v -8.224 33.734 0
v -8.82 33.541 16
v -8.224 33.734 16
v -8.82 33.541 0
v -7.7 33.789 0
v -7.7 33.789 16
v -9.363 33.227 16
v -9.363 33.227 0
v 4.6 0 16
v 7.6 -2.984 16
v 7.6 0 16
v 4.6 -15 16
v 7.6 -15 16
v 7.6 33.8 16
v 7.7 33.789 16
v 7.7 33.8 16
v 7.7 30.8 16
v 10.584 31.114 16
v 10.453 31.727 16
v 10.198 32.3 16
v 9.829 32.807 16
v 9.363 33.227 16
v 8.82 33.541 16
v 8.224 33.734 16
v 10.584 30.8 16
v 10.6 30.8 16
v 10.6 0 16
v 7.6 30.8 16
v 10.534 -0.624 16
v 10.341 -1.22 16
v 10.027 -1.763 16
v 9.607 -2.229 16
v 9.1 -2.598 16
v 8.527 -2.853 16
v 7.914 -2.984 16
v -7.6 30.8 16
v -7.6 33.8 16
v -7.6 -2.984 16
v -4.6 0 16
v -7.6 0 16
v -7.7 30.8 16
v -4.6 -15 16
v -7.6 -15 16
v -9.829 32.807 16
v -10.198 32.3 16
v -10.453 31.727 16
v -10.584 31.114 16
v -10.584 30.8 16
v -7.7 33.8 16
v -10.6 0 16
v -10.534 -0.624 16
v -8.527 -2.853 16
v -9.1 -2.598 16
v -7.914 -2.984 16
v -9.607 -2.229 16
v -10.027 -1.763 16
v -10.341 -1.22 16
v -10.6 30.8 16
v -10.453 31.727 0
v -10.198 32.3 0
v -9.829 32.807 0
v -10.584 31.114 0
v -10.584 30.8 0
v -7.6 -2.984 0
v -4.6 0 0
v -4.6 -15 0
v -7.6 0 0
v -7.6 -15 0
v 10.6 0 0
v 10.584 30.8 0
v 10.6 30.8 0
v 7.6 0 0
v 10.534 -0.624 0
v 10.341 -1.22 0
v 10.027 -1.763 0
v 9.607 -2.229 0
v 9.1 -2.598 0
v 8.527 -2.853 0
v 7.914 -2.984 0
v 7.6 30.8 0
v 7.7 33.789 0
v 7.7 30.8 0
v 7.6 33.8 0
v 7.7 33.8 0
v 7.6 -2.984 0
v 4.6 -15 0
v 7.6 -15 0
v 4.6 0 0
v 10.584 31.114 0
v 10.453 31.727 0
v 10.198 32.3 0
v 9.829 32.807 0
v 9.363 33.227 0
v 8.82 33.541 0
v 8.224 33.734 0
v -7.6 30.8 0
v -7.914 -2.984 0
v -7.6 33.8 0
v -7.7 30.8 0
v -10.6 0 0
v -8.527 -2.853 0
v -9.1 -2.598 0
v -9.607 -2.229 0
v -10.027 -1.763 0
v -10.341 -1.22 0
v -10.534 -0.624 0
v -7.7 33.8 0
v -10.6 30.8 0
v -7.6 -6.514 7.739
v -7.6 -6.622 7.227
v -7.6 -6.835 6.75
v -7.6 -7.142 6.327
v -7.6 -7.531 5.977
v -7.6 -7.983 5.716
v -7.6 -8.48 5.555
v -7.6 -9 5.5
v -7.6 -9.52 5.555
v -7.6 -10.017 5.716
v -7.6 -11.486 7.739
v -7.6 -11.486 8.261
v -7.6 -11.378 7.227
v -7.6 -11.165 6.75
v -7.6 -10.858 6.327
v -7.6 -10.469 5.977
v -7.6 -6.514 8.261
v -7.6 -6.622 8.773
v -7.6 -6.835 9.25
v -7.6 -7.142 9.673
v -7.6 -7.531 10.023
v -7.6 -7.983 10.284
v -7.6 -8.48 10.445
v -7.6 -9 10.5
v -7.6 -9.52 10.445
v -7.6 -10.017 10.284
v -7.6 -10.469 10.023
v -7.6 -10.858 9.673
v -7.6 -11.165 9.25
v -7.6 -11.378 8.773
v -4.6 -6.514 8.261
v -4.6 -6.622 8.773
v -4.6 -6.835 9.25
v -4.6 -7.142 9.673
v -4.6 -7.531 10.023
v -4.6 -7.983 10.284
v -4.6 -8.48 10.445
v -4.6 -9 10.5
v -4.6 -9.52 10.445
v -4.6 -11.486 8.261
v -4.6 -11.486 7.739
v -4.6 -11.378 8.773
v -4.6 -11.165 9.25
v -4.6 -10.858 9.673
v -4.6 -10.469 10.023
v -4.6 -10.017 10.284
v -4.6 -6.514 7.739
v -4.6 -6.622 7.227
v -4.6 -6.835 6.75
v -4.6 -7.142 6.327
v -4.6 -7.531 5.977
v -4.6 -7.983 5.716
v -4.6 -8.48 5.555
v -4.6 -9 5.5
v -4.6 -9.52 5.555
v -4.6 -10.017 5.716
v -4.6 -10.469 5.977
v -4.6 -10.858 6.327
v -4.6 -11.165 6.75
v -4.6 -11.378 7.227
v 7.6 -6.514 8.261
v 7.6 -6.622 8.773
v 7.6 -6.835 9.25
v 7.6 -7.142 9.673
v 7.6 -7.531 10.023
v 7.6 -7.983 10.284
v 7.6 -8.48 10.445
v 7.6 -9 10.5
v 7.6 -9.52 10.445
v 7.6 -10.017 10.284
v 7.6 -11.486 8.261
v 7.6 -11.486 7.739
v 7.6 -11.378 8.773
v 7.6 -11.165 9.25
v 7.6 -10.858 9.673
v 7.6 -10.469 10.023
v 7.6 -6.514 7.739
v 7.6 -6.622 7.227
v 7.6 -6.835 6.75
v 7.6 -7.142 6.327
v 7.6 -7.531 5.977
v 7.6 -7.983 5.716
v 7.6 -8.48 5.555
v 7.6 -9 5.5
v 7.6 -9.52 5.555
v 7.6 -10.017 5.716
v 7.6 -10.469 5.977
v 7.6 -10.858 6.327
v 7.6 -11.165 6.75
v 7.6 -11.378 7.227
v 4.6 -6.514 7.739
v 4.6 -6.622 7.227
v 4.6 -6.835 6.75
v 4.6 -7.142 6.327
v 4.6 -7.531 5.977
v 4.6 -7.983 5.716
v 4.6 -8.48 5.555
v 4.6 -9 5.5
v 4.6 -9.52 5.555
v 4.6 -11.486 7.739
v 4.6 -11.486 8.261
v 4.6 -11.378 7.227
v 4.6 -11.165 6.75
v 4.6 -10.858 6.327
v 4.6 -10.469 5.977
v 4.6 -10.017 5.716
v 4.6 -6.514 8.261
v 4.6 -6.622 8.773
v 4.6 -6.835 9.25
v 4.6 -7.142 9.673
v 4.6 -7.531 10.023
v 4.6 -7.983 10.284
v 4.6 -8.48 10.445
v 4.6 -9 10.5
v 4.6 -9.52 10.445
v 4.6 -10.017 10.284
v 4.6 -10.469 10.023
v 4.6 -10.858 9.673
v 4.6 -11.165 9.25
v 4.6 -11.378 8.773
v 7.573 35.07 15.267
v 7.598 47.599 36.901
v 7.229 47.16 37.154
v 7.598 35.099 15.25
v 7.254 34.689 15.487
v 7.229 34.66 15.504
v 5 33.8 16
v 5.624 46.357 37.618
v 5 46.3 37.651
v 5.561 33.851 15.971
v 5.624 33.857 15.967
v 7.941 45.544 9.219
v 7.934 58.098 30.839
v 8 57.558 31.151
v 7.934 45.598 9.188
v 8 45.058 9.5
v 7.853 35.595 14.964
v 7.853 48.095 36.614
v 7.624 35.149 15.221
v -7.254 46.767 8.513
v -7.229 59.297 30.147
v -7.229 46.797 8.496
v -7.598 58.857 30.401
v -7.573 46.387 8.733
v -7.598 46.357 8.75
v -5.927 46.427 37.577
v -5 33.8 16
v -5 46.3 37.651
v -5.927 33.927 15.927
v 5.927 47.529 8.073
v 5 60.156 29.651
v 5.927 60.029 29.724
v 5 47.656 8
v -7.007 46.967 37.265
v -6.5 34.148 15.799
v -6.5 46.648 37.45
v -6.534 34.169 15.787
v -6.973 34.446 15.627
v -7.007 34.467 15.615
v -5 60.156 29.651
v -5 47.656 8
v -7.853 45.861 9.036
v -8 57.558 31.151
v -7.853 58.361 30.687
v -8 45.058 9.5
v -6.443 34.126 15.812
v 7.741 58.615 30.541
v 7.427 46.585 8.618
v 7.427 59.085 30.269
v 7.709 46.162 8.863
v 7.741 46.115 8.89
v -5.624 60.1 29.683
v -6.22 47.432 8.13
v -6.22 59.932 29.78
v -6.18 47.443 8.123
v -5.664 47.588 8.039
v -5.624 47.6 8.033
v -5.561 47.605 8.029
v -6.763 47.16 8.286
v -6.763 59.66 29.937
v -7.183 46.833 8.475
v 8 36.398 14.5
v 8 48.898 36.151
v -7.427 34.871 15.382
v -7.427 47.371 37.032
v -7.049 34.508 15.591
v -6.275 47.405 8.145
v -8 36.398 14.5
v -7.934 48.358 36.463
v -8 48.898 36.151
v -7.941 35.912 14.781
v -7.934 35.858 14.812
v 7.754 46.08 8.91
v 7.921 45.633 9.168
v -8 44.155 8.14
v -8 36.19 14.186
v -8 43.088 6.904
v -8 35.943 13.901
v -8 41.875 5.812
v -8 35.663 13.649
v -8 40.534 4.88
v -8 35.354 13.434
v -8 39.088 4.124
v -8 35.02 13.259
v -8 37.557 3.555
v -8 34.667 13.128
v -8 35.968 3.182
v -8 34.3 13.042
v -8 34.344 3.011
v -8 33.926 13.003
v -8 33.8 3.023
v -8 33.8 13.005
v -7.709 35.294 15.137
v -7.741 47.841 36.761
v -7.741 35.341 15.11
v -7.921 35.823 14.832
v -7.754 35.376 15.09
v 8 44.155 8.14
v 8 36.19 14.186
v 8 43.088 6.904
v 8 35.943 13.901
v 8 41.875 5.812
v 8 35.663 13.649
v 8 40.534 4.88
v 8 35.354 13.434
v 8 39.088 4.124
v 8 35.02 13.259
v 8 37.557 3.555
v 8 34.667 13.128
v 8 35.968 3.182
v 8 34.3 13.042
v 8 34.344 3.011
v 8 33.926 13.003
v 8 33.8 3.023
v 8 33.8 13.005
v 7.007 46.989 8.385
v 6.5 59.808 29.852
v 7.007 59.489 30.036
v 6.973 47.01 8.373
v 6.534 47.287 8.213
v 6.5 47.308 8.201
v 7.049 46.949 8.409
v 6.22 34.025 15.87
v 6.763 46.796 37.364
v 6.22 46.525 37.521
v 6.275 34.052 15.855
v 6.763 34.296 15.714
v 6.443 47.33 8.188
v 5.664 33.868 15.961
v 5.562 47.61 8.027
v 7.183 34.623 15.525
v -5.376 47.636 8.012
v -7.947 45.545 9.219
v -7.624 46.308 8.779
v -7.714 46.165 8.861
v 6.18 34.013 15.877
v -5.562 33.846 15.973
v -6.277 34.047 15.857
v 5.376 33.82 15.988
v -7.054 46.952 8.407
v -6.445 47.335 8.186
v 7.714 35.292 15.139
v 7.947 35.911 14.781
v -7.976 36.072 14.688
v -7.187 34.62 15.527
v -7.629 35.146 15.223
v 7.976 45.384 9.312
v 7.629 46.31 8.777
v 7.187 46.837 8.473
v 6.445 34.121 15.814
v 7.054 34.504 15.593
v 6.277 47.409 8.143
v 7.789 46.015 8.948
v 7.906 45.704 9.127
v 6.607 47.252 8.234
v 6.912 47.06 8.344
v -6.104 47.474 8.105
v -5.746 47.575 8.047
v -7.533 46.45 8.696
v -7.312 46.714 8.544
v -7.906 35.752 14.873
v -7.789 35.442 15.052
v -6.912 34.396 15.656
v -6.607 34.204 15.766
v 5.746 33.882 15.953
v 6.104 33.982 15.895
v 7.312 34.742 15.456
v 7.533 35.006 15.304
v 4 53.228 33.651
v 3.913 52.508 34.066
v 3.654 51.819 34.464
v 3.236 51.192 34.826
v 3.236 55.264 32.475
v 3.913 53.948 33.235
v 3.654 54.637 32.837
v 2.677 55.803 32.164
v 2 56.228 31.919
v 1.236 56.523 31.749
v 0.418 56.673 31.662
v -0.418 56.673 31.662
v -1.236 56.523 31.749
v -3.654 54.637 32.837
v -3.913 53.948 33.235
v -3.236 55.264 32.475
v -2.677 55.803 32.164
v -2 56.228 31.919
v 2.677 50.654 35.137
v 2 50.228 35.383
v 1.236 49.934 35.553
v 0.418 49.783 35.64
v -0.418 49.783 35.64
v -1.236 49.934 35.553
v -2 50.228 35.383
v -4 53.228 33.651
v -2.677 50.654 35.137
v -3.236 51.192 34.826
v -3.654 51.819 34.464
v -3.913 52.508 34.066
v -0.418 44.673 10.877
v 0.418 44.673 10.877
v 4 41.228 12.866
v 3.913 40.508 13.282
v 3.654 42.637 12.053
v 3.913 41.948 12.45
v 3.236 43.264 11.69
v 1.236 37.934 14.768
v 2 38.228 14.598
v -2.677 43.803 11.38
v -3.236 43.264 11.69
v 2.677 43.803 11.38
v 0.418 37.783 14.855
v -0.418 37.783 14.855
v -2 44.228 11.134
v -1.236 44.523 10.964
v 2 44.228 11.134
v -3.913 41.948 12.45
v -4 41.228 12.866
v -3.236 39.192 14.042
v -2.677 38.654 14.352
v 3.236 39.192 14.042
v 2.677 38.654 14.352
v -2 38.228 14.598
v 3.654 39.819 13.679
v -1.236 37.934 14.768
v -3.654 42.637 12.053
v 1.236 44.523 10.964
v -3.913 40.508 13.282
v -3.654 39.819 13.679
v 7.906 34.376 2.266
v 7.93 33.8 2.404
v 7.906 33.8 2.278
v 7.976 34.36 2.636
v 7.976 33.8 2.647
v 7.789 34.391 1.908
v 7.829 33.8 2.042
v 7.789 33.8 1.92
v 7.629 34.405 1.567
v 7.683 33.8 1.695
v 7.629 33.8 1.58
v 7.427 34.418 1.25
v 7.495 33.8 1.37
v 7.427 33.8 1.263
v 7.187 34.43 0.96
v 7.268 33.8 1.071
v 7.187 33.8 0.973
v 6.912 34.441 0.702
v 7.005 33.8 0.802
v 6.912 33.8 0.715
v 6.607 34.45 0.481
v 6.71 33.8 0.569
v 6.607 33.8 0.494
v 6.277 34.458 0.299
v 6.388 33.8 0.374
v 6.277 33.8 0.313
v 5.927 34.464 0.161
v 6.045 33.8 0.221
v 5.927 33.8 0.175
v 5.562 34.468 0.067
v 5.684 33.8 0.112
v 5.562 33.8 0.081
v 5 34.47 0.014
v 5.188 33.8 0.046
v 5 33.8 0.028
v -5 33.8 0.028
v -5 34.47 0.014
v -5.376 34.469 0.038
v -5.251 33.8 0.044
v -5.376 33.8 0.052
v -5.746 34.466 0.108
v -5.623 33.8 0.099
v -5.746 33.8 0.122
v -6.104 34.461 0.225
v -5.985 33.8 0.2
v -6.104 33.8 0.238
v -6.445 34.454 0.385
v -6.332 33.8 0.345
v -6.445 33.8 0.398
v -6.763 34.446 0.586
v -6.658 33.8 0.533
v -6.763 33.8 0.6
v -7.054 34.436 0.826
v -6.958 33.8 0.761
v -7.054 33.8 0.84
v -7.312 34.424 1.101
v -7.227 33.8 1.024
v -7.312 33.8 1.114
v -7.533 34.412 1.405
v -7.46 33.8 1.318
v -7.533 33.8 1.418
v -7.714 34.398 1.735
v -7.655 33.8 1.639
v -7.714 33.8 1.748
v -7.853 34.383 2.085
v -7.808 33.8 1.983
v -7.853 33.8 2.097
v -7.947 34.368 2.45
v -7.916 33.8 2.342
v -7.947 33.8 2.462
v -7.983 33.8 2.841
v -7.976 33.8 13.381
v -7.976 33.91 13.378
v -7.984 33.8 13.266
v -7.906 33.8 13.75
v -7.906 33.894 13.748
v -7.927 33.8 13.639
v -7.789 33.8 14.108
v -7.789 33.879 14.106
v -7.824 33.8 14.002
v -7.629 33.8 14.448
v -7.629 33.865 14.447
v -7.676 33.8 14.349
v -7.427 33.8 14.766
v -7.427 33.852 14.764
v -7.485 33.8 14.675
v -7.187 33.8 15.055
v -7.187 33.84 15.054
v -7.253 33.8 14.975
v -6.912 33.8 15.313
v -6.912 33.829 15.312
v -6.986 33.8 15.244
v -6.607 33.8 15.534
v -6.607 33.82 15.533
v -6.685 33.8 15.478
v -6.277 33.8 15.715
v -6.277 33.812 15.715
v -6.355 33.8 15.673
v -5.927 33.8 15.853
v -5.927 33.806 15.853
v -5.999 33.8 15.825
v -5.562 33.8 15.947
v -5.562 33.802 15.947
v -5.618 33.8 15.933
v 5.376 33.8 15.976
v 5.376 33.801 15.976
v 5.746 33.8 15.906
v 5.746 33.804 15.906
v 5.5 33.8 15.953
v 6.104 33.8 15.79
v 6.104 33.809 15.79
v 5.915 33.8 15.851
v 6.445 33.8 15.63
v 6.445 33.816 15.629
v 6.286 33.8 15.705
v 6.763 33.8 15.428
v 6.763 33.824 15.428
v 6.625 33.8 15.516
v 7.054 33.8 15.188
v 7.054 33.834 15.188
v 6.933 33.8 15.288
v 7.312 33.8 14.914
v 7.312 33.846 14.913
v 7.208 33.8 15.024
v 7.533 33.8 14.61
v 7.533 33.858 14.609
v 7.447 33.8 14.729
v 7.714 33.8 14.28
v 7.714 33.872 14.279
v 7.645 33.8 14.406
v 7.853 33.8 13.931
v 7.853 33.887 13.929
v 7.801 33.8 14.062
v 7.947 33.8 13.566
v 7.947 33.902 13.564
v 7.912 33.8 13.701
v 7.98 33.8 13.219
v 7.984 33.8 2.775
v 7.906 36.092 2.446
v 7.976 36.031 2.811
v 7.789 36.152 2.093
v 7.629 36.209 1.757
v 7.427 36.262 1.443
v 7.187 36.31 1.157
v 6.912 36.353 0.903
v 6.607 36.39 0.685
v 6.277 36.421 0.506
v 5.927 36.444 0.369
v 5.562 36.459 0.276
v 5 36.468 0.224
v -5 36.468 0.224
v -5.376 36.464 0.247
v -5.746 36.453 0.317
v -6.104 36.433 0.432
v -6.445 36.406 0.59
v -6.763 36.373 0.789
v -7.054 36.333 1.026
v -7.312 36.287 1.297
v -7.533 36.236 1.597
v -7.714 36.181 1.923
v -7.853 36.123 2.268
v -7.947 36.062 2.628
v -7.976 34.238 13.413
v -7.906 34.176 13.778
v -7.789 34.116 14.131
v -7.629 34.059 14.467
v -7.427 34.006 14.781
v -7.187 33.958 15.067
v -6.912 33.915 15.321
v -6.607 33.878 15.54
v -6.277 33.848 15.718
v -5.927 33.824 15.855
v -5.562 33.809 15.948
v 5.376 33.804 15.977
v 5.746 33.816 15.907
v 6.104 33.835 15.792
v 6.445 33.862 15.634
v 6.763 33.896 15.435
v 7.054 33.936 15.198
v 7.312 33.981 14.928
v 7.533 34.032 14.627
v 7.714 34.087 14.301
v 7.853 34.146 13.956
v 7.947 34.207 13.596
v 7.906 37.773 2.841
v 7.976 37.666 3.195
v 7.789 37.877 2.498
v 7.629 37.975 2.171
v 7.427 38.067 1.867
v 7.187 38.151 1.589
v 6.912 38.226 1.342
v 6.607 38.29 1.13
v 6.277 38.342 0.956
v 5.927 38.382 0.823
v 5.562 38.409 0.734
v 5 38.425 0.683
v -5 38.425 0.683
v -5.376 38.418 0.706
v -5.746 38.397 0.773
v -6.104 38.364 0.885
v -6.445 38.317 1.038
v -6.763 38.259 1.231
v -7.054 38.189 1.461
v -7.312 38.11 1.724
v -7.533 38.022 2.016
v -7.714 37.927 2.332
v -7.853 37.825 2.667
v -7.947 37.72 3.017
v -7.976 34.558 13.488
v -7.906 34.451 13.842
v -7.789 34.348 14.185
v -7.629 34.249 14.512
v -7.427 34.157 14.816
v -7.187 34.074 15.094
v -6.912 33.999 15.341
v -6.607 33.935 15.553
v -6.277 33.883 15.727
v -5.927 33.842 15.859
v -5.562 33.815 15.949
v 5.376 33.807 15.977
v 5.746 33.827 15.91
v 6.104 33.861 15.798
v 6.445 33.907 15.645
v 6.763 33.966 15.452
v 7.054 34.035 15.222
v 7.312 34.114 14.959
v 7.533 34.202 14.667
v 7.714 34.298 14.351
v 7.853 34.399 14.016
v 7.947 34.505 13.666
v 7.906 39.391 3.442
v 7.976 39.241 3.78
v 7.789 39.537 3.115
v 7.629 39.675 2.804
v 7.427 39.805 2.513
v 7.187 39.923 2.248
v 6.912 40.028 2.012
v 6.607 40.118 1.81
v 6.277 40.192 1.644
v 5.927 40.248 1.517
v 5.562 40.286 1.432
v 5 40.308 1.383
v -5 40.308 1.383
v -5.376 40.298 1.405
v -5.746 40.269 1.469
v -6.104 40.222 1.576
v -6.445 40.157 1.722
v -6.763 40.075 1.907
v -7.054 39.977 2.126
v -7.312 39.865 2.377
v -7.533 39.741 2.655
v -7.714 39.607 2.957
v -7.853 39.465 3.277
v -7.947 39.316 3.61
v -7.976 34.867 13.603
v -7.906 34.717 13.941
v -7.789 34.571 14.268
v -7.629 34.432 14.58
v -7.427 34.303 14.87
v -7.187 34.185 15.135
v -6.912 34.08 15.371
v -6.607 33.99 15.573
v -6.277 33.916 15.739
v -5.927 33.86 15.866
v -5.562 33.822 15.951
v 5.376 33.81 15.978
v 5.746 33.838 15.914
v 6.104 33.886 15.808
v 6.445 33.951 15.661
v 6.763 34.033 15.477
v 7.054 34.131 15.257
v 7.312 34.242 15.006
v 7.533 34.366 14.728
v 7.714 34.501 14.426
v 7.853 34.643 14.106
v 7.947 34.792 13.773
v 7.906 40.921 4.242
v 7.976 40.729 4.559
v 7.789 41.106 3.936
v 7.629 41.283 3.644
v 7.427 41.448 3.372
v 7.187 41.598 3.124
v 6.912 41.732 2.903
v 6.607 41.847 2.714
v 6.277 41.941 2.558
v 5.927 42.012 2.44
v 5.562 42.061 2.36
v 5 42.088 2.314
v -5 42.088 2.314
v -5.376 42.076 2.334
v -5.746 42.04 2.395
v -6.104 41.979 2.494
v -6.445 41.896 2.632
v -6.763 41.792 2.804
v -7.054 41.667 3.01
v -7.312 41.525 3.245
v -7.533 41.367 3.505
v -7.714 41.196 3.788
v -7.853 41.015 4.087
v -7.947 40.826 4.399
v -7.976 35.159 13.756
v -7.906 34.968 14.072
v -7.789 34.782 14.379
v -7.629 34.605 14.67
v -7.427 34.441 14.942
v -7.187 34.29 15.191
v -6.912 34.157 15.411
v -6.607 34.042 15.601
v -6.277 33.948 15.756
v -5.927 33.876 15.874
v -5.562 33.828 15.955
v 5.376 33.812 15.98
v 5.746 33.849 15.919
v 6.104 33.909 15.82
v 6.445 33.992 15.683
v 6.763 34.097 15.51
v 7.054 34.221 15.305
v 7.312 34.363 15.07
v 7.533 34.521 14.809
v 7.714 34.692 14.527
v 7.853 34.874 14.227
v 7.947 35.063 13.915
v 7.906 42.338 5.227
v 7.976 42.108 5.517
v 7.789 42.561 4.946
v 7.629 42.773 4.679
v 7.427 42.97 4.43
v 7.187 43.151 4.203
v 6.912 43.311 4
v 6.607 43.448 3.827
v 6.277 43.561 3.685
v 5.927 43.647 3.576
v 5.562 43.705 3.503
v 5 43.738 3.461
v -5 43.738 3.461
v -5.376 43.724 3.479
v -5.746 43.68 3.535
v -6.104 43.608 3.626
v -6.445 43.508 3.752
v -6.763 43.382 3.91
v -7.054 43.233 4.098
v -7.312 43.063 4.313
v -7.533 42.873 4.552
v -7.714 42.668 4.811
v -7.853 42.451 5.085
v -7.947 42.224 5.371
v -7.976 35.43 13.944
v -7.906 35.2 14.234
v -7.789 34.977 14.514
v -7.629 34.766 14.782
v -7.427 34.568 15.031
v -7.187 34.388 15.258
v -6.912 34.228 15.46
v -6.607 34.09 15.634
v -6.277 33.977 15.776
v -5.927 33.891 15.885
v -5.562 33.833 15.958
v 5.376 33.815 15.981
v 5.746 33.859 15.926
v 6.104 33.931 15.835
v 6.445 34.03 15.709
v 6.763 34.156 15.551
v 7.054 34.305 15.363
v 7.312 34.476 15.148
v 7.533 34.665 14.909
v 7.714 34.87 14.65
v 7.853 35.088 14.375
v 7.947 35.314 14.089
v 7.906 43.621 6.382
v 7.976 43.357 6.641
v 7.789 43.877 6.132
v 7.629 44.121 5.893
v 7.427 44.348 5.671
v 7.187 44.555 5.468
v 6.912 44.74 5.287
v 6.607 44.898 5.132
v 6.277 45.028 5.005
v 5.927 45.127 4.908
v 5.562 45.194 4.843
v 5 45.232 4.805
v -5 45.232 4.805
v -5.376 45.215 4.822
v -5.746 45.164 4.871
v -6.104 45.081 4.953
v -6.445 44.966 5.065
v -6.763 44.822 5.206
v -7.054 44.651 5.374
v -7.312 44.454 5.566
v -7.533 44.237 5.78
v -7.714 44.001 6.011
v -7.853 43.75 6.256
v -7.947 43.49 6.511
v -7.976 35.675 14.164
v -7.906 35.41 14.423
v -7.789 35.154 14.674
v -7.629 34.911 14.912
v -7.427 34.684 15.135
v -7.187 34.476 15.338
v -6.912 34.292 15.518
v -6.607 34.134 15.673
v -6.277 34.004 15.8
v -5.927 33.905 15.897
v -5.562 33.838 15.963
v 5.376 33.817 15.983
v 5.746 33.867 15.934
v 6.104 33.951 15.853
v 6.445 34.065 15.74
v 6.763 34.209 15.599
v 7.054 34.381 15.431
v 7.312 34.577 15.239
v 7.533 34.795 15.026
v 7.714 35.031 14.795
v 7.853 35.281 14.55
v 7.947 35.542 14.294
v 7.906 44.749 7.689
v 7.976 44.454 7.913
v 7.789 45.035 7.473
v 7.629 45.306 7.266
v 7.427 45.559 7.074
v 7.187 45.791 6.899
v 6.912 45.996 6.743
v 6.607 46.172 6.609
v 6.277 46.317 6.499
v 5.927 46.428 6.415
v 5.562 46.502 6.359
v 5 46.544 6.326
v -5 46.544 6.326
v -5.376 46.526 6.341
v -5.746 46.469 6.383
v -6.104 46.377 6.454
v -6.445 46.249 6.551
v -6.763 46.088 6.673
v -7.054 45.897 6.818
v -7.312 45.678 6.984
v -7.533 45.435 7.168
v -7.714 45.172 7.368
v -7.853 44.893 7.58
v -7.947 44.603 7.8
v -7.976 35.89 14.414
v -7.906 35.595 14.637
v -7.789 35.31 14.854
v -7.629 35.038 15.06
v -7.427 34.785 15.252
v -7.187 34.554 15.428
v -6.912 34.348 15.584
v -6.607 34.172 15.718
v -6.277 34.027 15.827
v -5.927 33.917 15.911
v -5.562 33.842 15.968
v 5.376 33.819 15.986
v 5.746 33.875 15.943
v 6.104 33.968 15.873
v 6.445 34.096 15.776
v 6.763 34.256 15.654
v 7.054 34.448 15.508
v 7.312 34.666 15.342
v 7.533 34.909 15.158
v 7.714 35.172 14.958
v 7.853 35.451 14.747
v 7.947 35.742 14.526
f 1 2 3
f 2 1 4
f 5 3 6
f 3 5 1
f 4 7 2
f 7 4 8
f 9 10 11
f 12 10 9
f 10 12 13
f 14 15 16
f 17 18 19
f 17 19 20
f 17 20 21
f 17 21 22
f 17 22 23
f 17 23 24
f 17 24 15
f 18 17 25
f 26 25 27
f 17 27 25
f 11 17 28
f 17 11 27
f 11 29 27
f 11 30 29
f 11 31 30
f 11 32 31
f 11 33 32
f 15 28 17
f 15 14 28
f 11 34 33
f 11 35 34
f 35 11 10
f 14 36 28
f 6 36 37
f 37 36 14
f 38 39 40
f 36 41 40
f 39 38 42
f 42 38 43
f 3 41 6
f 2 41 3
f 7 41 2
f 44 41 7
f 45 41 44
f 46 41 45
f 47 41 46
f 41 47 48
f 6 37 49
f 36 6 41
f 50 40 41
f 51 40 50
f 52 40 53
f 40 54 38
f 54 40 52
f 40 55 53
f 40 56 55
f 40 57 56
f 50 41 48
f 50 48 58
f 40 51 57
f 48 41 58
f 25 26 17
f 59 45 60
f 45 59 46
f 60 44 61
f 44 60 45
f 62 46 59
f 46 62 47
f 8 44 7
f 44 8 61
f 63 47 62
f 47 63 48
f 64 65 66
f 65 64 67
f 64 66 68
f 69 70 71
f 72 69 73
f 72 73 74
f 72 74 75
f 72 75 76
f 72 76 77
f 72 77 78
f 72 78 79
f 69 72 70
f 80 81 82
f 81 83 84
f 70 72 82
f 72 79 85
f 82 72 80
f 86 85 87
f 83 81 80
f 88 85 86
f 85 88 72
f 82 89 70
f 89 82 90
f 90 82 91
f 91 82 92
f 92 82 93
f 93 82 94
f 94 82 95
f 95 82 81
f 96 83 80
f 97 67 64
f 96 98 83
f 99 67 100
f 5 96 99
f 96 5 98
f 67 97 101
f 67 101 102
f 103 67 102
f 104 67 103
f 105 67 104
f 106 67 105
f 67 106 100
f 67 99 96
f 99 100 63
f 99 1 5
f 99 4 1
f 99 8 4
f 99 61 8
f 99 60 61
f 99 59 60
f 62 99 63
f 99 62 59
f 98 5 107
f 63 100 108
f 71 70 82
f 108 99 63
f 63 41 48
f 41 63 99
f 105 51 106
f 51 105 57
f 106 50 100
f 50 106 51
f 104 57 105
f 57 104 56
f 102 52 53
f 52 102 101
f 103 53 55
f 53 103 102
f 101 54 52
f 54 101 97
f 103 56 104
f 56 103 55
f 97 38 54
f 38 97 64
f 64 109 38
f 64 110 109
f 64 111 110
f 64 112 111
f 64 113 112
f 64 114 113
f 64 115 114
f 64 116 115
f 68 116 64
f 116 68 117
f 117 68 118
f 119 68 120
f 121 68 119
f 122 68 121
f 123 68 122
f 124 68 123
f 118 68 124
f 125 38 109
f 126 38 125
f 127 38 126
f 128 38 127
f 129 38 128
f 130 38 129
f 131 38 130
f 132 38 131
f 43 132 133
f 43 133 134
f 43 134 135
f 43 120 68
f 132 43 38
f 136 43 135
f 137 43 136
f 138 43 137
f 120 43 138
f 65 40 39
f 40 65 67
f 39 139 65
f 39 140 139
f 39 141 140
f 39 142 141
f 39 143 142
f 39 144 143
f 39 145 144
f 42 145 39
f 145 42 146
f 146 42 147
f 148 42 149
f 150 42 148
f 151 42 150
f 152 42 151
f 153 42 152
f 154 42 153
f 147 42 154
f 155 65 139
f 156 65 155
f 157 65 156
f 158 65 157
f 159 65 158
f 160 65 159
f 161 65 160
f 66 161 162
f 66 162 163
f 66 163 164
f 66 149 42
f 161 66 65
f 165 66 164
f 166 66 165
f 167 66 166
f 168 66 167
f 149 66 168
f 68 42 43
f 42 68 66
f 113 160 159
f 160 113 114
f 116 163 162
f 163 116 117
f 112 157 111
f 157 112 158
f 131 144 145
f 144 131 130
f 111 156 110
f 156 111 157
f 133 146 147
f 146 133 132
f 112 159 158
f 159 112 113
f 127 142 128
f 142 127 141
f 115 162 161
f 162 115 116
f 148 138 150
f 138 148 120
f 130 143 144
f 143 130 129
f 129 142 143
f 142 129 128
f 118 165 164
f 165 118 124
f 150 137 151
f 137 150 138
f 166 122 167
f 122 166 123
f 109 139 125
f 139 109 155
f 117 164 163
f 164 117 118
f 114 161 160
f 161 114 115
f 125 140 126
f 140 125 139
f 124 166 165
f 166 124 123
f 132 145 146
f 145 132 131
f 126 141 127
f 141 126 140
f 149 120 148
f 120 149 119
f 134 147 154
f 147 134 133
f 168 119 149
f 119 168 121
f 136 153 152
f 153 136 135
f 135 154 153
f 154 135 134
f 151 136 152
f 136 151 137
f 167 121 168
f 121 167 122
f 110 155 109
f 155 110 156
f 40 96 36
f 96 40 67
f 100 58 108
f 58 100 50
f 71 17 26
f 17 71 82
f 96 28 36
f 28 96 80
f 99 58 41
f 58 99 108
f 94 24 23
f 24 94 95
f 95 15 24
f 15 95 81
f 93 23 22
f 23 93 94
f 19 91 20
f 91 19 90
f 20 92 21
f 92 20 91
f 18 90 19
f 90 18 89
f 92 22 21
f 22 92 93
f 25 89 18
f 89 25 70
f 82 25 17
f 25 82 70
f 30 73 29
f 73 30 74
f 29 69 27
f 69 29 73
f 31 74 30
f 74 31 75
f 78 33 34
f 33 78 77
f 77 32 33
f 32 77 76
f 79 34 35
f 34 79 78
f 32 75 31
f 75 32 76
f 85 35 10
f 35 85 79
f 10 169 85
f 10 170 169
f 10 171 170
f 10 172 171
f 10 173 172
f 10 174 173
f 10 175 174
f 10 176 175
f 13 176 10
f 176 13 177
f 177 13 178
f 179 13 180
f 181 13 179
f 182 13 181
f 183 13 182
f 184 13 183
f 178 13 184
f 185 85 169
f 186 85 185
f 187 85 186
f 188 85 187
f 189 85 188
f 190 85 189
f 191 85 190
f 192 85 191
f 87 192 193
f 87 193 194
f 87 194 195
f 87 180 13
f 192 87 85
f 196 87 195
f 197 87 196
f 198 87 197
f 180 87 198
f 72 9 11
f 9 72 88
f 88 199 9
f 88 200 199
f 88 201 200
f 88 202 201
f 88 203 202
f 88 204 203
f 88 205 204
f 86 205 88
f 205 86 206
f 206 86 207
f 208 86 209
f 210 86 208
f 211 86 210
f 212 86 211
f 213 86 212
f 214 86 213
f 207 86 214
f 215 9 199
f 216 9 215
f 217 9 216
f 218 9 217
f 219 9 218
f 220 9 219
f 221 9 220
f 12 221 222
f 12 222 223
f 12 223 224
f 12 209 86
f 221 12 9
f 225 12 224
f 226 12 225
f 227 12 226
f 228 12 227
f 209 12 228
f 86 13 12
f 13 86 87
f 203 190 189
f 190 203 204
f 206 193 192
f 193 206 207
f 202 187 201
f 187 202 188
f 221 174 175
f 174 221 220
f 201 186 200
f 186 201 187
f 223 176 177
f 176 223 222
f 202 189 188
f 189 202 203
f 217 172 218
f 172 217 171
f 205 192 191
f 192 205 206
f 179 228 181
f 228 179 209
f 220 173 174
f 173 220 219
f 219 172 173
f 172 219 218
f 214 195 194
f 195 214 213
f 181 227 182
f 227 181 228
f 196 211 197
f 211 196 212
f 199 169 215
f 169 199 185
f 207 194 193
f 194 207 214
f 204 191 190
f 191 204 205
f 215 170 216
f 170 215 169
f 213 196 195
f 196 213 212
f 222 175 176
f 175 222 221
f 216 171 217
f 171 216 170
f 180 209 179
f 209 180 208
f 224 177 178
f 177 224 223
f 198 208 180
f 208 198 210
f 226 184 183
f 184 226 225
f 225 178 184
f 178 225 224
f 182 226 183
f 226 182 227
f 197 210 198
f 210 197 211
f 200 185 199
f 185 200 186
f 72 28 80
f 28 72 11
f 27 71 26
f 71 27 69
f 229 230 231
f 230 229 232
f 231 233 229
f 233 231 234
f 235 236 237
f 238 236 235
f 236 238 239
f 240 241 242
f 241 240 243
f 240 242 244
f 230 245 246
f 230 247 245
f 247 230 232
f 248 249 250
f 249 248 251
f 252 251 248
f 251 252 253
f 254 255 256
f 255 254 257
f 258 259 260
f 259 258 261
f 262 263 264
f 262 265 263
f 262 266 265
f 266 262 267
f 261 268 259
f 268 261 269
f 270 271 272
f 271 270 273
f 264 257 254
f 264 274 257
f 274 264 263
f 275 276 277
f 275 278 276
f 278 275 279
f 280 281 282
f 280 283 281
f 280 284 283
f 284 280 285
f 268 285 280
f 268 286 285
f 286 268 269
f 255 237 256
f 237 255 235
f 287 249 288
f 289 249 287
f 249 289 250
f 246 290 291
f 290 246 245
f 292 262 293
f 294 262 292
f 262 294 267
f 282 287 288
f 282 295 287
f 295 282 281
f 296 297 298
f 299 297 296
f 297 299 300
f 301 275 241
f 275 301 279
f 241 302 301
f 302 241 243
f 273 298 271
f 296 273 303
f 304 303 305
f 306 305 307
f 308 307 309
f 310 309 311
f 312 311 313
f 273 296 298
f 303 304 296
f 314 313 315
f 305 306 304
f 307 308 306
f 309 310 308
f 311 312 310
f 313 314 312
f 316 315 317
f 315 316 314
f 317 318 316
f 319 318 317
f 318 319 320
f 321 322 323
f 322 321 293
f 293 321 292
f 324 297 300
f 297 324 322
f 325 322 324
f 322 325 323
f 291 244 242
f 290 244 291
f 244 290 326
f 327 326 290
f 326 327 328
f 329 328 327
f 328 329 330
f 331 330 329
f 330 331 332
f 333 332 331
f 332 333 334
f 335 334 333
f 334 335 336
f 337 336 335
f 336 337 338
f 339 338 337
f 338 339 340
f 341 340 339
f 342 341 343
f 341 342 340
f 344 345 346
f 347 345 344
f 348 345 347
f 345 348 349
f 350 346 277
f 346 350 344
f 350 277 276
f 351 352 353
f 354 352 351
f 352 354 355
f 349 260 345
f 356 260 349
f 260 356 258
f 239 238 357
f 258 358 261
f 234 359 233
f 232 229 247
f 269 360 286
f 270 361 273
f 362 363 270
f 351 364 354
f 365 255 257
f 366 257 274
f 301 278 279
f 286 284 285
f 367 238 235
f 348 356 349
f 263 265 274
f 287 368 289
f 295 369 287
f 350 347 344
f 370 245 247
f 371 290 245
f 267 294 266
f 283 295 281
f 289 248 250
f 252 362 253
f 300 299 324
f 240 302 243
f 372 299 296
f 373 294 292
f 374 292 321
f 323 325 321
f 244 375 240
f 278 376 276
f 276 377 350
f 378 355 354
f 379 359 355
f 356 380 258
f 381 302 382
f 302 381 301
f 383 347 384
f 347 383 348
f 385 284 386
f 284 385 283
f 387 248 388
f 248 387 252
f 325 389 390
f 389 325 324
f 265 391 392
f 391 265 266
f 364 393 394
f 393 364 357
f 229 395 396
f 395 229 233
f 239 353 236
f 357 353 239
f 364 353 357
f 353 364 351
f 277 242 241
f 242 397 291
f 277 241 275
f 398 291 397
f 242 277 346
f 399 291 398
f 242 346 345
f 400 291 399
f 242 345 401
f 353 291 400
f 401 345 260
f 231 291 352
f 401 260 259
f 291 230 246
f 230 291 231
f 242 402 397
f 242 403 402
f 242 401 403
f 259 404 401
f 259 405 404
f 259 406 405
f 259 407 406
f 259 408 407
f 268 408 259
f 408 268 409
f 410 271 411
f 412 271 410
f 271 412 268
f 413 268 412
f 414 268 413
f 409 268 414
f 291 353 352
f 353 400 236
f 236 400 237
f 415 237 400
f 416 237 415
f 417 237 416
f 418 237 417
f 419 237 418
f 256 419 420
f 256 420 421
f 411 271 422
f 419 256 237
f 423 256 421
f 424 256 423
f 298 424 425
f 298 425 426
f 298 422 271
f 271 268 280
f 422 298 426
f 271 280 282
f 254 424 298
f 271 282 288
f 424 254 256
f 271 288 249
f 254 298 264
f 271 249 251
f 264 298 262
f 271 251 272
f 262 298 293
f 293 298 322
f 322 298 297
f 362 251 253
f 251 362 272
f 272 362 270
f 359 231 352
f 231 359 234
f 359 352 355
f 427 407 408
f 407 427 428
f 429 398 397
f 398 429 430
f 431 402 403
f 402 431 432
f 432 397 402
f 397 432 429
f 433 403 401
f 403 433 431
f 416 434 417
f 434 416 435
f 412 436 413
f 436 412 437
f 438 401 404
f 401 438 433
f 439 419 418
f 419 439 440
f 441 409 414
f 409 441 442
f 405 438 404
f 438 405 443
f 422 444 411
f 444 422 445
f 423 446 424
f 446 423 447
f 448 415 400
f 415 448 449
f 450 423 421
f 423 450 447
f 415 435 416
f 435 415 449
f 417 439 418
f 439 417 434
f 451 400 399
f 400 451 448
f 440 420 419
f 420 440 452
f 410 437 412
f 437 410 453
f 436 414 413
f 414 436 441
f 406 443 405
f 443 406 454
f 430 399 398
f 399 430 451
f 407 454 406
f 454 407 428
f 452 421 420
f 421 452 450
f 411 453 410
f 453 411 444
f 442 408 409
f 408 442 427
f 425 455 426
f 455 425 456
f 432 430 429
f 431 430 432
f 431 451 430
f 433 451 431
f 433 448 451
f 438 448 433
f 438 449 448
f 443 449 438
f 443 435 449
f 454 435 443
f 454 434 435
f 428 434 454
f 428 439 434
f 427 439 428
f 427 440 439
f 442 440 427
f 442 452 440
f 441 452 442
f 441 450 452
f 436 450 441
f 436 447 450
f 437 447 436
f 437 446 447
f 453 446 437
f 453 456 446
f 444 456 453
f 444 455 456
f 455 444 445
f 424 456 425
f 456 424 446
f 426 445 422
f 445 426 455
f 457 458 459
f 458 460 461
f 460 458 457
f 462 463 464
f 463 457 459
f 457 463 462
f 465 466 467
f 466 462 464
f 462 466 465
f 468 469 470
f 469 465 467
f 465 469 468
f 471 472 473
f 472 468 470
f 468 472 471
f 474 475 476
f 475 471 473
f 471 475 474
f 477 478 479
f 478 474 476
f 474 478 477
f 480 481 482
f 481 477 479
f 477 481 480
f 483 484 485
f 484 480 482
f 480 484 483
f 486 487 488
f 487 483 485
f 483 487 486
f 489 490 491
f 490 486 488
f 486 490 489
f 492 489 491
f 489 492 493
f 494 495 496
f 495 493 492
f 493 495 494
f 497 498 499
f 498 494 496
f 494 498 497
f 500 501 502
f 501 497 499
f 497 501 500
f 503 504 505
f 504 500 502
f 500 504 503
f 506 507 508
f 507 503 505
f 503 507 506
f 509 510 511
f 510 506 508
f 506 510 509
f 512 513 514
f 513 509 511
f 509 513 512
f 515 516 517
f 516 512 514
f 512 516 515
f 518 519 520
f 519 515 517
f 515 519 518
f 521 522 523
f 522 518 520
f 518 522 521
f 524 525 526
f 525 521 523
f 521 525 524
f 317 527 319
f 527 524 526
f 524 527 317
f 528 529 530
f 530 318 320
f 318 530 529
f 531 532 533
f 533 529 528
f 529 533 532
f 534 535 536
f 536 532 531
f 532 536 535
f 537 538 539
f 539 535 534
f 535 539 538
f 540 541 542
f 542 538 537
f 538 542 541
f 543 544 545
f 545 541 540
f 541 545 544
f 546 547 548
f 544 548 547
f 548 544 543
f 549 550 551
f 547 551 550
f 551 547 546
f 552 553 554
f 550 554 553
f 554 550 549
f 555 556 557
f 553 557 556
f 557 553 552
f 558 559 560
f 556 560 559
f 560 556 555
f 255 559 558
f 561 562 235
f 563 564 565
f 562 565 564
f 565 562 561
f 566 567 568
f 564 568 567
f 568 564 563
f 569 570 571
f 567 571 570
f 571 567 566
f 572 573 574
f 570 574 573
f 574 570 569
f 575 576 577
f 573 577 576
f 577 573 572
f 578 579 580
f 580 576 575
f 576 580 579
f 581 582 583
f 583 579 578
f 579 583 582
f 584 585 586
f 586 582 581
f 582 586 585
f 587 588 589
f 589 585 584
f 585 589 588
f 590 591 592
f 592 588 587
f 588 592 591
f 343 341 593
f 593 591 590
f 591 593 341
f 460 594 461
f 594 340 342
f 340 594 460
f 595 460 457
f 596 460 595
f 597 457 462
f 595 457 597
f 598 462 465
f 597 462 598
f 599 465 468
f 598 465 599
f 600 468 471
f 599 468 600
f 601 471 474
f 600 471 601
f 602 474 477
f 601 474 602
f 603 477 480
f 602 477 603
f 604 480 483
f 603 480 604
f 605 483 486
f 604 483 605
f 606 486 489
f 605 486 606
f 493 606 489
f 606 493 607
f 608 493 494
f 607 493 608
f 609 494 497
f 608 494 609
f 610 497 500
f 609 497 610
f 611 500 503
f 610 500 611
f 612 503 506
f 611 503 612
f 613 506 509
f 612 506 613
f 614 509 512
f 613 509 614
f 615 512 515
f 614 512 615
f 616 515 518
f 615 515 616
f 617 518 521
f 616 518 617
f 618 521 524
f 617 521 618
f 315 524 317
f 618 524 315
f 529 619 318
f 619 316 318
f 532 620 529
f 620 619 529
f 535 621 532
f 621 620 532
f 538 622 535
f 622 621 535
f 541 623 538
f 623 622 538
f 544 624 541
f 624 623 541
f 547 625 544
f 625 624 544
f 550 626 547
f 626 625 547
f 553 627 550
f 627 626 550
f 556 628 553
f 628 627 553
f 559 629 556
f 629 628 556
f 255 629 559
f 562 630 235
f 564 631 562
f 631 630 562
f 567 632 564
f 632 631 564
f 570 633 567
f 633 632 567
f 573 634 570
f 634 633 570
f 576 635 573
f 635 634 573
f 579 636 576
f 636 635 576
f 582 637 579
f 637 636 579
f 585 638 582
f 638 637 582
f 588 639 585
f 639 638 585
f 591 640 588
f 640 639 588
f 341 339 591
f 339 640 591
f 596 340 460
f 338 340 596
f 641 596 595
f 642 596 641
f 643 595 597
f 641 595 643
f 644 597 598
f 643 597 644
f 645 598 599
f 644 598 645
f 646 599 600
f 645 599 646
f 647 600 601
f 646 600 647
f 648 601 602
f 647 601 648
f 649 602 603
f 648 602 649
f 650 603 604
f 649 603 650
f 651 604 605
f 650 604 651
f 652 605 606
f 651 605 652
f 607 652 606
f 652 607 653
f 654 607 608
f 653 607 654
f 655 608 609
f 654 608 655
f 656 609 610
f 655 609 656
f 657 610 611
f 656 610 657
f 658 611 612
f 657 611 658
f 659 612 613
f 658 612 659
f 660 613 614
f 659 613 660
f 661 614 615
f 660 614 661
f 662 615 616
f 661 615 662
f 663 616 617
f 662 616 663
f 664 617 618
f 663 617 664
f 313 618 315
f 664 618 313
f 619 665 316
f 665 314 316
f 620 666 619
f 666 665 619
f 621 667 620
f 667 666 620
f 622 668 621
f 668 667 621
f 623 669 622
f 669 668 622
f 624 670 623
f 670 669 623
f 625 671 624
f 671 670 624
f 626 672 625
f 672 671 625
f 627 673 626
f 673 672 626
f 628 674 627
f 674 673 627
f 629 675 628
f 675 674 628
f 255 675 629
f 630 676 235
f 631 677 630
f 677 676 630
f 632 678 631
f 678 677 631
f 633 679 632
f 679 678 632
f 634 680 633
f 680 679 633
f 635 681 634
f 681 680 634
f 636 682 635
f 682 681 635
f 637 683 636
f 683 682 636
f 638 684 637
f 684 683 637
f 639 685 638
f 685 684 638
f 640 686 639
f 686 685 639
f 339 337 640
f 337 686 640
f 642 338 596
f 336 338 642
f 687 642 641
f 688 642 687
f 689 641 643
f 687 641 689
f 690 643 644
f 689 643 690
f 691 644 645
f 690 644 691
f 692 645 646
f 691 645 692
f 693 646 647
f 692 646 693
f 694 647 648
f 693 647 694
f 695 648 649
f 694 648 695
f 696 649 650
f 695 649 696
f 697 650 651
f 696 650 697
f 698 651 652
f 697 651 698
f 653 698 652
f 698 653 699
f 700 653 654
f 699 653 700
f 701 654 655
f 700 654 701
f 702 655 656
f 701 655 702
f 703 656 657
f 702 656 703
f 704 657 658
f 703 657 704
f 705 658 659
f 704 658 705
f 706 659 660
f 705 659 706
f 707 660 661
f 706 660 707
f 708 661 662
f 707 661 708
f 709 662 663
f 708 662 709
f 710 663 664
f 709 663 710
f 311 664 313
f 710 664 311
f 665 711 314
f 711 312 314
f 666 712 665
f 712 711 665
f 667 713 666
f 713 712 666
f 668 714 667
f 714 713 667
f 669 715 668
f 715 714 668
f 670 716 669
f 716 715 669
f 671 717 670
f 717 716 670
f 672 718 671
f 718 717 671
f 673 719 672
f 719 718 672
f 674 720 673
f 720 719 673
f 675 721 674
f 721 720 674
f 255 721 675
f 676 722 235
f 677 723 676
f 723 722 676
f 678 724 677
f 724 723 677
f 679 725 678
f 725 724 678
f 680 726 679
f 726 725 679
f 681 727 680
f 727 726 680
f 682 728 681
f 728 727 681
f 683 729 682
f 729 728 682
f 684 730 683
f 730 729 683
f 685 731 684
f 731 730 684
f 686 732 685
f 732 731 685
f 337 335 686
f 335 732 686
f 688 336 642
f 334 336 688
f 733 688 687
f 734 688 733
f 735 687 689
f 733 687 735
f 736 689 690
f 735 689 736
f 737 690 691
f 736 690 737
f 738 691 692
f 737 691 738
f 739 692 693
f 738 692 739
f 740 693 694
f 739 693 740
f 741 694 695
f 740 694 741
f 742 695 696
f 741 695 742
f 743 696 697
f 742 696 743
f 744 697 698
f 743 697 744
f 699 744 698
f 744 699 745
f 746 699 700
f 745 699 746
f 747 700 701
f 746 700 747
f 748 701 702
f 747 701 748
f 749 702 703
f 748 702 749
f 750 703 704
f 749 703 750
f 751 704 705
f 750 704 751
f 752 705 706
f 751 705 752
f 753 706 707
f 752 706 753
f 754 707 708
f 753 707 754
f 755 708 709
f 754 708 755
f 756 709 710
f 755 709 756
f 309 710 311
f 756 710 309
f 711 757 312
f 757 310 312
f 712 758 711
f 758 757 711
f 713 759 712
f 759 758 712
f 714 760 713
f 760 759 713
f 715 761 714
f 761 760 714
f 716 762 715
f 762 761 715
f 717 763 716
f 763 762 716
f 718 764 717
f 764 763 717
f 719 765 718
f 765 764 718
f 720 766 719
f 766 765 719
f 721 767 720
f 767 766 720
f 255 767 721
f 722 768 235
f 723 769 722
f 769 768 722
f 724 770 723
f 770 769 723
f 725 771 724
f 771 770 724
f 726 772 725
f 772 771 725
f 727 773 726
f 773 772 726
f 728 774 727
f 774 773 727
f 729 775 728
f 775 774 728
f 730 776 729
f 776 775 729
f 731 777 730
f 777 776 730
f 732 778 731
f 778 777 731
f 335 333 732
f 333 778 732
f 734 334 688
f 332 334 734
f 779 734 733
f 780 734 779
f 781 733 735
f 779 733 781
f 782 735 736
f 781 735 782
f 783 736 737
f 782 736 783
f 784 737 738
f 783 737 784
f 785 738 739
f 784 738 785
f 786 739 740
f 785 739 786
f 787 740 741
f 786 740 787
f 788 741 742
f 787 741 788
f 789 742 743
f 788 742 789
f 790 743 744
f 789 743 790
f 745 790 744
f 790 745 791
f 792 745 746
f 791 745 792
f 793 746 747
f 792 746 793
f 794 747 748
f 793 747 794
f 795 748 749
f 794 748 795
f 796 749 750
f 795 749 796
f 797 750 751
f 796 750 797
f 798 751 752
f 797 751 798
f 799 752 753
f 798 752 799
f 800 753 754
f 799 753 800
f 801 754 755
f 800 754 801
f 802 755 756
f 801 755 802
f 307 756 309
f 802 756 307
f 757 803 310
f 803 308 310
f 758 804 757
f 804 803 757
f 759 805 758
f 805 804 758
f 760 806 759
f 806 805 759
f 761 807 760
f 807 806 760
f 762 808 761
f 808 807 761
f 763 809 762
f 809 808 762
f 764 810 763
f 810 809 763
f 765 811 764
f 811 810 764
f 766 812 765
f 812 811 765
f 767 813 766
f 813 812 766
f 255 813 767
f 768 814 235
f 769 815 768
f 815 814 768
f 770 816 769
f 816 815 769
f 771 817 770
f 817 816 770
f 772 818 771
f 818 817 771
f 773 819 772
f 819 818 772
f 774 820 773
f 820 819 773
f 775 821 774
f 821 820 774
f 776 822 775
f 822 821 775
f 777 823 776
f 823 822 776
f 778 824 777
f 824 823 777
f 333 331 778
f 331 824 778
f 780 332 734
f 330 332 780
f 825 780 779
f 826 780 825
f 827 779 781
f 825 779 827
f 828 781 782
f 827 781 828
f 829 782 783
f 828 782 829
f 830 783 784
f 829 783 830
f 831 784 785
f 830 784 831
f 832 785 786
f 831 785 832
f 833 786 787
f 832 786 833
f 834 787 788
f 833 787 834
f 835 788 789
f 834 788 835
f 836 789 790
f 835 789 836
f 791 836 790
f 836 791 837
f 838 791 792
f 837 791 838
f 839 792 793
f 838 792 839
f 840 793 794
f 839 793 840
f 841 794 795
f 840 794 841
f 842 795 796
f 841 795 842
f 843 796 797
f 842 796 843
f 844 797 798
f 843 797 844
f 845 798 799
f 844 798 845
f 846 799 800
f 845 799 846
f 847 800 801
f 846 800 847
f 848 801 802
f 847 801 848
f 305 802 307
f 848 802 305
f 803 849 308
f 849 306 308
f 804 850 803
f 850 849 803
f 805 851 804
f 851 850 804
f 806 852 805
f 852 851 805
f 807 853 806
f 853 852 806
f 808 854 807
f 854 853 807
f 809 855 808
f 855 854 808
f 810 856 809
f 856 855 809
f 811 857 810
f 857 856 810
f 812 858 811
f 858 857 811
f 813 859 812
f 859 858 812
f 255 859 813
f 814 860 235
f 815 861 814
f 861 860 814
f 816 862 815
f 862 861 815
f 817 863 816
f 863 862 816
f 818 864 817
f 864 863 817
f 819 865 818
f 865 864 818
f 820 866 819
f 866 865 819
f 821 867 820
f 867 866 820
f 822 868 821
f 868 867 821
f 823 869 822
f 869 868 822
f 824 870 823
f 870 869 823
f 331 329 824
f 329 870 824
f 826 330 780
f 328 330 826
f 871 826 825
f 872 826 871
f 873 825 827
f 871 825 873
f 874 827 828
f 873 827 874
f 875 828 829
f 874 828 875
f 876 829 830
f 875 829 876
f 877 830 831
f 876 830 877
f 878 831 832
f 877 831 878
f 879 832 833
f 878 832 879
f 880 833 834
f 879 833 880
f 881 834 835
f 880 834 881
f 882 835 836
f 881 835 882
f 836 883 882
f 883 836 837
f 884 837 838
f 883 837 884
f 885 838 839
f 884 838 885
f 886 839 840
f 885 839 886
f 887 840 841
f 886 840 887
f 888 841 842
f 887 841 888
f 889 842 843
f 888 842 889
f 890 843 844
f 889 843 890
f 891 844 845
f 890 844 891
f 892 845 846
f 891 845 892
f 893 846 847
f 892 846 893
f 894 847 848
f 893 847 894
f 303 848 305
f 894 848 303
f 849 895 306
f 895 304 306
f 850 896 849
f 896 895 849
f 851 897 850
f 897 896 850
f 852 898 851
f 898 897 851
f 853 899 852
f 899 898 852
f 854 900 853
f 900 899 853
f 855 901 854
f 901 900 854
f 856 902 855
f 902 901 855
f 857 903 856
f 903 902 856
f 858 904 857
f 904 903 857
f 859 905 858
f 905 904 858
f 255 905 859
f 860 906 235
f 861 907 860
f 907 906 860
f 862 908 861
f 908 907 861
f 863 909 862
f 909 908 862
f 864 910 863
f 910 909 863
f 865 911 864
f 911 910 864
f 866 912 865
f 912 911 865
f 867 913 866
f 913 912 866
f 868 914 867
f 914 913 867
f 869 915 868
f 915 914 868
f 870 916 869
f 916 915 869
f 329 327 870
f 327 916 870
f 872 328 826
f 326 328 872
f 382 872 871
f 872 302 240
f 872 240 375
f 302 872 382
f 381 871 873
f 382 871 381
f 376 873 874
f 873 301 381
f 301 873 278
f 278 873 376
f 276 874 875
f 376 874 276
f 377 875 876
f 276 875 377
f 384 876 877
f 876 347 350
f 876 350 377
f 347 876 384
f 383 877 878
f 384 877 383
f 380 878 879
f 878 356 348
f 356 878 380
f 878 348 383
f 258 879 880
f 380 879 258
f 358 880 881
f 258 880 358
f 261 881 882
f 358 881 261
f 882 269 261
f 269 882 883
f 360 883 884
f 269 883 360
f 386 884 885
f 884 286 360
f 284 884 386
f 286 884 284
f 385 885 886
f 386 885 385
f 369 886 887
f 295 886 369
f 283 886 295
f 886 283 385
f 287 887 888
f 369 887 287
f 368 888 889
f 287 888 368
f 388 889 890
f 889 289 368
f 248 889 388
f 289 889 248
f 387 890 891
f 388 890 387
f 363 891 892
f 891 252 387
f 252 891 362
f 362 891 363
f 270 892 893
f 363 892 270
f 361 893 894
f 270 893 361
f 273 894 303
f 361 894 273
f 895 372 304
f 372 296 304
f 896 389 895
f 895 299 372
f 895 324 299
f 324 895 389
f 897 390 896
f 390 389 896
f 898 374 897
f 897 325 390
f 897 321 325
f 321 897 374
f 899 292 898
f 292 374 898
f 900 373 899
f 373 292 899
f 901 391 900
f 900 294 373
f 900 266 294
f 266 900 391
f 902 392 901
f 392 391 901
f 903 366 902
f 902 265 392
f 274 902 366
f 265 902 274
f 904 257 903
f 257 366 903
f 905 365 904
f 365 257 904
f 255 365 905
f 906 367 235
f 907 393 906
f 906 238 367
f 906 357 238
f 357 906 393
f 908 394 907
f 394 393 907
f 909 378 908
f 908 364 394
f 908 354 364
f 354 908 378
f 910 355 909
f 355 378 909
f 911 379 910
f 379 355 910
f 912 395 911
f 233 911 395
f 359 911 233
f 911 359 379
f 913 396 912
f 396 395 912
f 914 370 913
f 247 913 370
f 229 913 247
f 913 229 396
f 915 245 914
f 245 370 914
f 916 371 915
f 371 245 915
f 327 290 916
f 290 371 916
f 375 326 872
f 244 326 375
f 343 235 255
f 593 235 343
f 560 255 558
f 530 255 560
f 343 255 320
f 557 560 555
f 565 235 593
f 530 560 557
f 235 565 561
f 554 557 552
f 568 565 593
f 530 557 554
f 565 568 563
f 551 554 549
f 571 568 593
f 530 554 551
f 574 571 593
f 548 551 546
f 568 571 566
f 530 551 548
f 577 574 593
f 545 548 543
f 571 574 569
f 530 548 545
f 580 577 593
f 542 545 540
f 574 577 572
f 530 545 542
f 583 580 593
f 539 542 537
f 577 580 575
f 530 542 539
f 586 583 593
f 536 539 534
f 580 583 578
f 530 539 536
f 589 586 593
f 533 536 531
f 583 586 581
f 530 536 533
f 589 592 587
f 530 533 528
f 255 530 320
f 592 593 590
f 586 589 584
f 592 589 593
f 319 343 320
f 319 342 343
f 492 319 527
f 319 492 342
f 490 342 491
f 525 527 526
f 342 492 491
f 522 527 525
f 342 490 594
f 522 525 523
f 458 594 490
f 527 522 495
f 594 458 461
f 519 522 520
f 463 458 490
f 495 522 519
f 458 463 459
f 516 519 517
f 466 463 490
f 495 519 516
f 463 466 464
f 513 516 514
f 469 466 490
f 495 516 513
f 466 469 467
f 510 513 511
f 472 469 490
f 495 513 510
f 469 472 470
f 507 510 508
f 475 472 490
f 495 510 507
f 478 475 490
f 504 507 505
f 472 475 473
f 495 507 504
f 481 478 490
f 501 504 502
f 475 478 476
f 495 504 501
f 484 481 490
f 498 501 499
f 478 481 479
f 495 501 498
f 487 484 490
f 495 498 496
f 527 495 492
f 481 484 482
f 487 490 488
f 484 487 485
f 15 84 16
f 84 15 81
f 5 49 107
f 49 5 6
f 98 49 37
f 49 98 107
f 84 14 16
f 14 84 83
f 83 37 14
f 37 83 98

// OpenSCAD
// file: config.scad
/**
 * Глобальный конфигурационный файл
 */
// качество цилиндров
$fn=30;

// избегание совпадения граней
DELTA=0.1;

// толщина рамы
FRAME=15;
// main file
include <config.scad>

// диаметр поперечного отверстия
d3=5;

// боковая деталь - стенка
// длина (толщина)
x2=3;
// ширина
y2=30.8;
// высота
z2=16;
// расстояние от центра
x3=FRAME/2+0.1+x2;
// ширина хвостовой части
y3=15;

// верхняя часть
// ребро квадрата
x1=10;
// радиус закругления
r1=3;
// угол загиба, 0..360
a=60;
// ребро куба для вырезания
b=25;

module quarter() {
intersection() {
    cylinder(r=x2, h=z2);
    cube([x2,x2,z2]);
}
}

module hpart_bottom() {
    translate([-x3,0,0])cube([x2,y2,z2]);
    translate([-x3+x2,y2,0])rotate([0,0,90])quarter();
    translate([-x3+x2,0,0])rotate([0,0,180])quarter();
    translate([-x3+x2,-y3,0])difference() {
        cube([x2,y3,z2]);
        translate([-DELTA,(y3-x2)/2,z2/2])rotate([0,90,0])cylinder(r=d3/2, h=x3);
    }
}

module zagib() {
intersection() {
    rotate_extrude($fn=50)offset(r=r1)translate([r1,r1,0])square(x1);
    if (a<=90) cube(b);
    if (a<=90) rotate([0,0,a-90])cube(b);
        
    if (a>90 && a<=180) {
        cube(b);
        rotate([0,0,a-90])cube(b);
    }
    if (a>180 && a<=270) {
        translate([-b,0,0])cube([b*2,b,b]);
        rotate([0,0,a-90])cube(b);
    }
    if (a>270 && a<=360) {
        translate([-23,0,0])cube([b*2,b,b]);
        rotate([0,0,a-180])translate([-b,0,0])cube([b*2,b,b]);
    }
}
}

module holder_part02() {
hpart_bottom();
mirror([1,0,0]) hpart_bottom();
translate([-x3+x2-DELTA,y2,0])cube([(x3-x2)*2+DELTA*2,x2,z2]);

translate([0,y2+x2,x1+r1*2]) {
    rotate([a-90,0,0])
    translate([-x1/2,r1,0])
    difference() {
        linear_extrude(height=25)offset(r=r1)square(x1);
        translate([x1/2,x1/2,1])cylinder(r=4,h=25);
    }
    
    translate([x1/2+r1,0,0])rotate([-90,90-a,90])zagib();
}
}

holder_part02();
